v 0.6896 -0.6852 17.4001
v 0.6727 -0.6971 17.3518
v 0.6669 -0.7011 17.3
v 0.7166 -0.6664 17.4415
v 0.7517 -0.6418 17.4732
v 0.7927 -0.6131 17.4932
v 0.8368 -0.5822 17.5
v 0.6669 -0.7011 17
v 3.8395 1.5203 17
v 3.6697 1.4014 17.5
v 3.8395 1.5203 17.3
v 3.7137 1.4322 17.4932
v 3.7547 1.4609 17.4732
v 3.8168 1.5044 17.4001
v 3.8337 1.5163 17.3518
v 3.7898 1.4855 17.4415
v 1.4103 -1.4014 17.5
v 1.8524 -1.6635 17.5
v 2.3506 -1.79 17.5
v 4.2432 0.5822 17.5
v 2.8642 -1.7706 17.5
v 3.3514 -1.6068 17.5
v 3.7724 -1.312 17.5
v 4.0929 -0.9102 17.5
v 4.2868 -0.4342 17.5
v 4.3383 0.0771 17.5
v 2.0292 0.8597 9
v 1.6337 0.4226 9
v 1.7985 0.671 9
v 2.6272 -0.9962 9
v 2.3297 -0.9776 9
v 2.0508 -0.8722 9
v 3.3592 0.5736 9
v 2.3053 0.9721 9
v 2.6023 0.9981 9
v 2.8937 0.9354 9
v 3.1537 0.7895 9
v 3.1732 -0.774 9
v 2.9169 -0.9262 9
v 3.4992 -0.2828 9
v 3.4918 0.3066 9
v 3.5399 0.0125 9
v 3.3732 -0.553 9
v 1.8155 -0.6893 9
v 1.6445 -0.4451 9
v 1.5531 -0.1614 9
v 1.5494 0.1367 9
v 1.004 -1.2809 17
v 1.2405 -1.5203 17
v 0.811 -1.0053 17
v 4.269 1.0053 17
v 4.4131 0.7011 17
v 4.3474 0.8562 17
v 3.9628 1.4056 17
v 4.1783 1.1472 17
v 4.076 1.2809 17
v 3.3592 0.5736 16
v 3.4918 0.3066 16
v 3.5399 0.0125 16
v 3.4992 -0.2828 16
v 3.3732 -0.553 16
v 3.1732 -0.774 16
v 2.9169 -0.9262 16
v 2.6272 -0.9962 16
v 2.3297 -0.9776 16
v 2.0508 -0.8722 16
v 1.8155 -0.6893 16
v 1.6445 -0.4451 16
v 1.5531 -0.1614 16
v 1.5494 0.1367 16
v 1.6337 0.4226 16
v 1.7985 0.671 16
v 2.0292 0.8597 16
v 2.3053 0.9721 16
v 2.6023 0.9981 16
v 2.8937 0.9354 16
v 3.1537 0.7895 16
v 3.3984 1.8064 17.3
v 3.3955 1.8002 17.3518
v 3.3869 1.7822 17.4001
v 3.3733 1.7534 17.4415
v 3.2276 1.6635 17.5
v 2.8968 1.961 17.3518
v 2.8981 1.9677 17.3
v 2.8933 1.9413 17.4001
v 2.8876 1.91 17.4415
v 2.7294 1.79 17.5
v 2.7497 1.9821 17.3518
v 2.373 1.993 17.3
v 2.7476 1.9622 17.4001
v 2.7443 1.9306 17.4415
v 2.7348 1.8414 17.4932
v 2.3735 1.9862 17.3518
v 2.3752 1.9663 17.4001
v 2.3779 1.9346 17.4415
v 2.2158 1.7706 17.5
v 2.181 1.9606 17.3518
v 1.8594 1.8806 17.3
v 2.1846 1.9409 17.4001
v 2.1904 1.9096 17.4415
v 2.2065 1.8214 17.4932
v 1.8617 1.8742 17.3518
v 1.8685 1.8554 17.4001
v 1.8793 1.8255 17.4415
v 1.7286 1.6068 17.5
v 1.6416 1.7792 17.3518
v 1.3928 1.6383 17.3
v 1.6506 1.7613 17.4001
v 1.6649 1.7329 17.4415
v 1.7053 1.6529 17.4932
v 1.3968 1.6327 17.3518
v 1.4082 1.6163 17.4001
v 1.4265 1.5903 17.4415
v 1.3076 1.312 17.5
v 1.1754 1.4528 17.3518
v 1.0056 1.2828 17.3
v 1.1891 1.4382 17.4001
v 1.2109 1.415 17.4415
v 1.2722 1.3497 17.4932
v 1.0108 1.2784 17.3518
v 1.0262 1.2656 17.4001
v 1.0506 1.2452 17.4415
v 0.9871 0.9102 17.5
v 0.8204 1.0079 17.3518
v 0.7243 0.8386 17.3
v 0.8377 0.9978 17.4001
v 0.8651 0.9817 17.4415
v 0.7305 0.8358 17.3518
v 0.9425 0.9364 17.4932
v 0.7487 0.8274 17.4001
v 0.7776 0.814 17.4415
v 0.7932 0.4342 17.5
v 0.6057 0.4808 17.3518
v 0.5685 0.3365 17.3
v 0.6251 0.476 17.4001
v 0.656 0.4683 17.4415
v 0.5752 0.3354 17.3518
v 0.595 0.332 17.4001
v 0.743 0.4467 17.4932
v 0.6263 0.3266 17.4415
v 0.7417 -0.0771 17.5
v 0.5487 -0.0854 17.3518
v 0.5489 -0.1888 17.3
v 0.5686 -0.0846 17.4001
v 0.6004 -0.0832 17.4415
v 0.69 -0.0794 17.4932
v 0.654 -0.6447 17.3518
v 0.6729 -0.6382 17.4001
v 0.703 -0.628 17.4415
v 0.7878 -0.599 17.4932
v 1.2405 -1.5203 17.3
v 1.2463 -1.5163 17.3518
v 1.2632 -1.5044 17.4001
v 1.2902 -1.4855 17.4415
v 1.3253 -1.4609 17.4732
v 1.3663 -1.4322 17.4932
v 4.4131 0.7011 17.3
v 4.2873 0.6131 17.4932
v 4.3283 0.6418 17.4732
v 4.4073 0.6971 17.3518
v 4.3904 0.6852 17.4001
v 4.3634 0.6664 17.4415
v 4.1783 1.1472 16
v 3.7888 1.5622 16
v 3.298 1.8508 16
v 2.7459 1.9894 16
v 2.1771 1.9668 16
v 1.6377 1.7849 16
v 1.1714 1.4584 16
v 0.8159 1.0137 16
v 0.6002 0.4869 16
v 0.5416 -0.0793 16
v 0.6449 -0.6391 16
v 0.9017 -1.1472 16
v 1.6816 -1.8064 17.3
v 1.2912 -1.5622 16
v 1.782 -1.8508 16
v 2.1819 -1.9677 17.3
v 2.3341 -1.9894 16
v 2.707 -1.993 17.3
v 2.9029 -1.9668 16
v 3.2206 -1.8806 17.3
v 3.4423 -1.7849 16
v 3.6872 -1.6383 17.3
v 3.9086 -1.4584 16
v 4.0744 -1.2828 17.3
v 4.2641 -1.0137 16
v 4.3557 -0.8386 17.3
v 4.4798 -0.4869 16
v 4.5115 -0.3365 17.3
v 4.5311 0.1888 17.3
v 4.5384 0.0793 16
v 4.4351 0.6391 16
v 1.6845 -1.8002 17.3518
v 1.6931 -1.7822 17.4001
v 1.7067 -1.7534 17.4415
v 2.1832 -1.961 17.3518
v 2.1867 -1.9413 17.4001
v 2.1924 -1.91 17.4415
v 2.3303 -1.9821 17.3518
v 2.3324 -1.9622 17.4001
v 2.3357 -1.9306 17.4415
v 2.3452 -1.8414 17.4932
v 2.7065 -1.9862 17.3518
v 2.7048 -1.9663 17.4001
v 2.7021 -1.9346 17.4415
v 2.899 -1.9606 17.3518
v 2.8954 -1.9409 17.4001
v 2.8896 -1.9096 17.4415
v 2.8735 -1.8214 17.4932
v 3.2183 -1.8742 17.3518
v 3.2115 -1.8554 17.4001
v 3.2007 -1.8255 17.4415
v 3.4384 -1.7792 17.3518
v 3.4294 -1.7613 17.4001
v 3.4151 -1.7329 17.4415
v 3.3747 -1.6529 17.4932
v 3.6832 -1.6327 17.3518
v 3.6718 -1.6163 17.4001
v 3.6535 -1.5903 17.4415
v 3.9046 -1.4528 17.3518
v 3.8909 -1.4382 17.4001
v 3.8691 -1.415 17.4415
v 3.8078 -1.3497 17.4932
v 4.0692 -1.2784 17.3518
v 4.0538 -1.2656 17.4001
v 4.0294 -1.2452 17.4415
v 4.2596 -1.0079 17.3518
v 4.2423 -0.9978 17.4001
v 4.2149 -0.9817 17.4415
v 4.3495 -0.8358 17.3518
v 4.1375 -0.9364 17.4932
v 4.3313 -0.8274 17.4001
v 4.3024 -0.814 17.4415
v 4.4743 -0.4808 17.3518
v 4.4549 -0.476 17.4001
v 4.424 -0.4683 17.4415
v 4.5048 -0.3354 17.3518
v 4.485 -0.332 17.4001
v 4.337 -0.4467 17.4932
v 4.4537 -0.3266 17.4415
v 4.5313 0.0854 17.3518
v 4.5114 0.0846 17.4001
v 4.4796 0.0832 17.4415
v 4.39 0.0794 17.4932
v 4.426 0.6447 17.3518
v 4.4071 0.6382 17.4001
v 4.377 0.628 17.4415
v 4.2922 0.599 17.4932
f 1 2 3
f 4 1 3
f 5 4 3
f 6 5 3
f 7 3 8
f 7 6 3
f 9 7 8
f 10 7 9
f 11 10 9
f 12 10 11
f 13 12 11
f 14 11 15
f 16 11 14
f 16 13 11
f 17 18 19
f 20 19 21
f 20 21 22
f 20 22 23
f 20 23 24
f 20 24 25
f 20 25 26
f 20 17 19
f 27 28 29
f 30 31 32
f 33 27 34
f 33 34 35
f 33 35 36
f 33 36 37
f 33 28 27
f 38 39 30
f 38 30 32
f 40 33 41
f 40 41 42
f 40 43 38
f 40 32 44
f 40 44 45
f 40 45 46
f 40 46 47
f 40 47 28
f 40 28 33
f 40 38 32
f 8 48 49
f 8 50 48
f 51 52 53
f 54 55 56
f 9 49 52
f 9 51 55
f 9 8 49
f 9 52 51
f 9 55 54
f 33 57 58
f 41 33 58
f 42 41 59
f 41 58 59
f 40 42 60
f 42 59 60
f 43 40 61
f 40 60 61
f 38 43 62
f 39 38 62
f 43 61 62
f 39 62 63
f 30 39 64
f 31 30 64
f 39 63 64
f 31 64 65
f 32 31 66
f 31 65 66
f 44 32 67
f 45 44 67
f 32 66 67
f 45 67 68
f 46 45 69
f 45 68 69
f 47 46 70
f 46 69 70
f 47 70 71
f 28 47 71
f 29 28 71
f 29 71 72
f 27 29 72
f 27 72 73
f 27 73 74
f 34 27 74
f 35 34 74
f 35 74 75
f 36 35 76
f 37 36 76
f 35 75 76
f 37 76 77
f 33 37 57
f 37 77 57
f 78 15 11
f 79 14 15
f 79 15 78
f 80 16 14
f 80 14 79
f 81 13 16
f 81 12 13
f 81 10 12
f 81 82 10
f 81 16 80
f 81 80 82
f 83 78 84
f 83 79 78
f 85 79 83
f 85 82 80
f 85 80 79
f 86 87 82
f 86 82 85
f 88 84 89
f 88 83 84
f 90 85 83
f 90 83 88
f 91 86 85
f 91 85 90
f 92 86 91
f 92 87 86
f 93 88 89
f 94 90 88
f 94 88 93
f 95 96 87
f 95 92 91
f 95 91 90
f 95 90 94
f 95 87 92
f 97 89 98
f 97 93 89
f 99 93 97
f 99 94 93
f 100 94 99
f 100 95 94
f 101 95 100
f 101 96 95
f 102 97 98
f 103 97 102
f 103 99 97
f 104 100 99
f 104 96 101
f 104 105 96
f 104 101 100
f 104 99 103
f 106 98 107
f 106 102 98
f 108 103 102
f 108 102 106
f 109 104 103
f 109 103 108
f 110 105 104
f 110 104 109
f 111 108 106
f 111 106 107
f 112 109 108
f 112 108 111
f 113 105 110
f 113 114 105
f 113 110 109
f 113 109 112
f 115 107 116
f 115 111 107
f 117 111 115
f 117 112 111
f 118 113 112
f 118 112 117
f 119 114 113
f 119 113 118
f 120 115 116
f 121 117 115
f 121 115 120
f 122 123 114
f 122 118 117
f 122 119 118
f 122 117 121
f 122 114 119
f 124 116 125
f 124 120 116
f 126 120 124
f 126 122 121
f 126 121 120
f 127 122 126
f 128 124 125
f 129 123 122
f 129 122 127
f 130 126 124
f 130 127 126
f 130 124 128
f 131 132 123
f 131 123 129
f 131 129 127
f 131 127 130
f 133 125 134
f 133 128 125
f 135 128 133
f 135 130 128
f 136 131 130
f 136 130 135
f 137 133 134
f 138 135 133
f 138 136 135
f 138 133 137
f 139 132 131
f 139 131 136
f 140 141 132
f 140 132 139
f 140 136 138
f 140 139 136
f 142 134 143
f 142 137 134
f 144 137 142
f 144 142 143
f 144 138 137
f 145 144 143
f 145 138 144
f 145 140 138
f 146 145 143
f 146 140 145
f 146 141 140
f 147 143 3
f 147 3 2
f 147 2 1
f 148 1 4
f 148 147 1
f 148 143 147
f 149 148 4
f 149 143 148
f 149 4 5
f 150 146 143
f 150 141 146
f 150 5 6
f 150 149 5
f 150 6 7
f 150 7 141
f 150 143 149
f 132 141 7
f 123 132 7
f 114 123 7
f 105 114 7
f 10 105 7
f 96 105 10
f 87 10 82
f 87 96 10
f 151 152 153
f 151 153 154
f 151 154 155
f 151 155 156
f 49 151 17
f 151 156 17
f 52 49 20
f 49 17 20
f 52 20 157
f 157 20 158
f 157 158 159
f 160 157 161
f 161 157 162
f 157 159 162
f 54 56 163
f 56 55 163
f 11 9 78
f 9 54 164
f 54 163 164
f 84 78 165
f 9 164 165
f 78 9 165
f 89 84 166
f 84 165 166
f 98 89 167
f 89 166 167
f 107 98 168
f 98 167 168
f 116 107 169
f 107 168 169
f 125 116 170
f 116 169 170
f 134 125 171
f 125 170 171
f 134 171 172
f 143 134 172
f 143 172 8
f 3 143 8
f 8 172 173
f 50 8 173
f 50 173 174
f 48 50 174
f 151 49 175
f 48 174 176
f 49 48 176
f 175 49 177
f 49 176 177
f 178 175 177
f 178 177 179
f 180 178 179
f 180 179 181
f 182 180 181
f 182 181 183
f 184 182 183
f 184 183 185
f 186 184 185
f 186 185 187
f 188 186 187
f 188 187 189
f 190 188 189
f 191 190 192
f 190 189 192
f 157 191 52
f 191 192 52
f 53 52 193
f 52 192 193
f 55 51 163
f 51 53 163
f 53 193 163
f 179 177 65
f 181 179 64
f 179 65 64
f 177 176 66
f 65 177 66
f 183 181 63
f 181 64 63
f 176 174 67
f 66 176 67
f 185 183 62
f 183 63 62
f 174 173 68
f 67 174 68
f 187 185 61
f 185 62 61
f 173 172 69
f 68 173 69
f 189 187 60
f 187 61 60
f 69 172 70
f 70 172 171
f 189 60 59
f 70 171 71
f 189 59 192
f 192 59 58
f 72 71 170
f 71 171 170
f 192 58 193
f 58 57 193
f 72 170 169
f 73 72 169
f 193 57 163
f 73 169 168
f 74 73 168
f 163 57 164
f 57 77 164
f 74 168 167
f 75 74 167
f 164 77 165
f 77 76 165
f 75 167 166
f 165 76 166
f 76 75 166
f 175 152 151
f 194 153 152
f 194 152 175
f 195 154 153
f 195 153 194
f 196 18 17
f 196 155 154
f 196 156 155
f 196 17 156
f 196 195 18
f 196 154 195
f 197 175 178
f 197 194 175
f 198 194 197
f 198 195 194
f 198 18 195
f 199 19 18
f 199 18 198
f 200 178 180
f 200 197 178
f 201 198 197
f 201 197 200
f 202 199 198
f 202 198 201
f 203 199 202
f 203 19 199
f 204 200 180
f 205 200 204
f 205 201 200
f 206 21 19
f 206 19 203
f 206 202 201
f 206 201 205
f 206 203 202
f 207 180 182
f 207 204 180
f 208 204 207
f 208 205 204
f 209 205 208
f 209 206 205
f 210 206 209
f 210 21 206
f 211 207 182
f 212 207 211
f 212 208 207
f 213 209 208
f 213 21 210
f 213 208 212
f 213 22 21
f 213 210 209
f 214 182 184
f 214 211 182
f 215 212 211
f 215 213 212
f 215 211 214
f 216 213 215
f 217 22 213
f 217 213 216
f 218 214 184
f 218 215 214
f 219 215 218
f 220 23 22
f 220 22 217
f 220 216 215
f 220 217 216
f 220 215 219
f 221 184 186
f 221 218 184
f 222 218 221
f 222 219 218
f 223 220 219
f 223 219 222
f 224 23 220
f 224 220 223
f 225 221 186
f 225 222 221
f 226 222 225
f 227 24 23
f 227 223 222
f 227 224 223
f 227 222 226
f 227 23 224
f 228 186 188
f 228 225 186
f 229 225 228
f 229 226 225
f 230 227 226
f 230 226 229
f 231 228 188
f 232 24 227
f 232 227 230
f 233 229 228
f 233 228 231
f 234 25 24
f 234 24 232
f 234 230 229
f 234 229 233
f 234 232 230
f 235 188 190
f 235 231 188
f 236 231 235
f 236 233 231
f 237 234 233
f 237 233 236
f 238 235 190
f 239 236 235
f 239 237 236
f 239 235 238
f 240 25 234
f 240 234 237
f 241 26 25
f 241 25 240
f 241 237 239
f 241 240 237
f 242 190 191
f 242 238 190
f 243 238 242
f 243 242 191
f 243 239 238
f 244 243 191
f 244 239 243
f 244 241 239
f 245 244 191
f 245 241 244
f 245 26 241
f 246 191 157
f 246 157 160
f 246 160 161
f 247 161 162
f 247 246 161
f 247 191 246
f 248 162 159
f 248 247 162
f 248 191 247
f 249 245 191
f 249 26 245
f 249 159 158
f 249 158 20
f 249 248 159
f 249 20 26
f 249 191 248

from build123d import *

# Parameters (mm, degrees)
SKETCH003_R             = 2
PAD001_DEPTH            = 1.5
SKETCH004_R             = 1
PAD002_DEPTH            = 7
FILLET_R                = 0.2
SKETCH005_W             = 4.5
SKETCH005_H             = 1
POCKET002_DEPTH         = 0.5
BODY001_PLACEMENT_ANGLE = 35


with BuildPart() as part:
    # Sketch003 → Pad001 (new body)
    with BuildSketch(Plane.XY):
        Circle(SKETCH003_R)
    extrude(amount=PAD001_DEPTH)

    # Sketch004 (on Face2 of Pad001) → Pad002 (join)
    with BuildSketch(Plane(origin=(0, 0, 0), x_dir=(1, 0, 0), z_dir=(0, 0, -1))):
        Circle(SKETCH004_R)
    extrude(amount=PAD002_DEPTH)

    # Fillet
    fillet_edges = [part.edges().sort_by_distance(p)[0] for p in [
        (-2, 0, 1.5),
    ]]
    fillet(fillet_edges, radius=FILLET_R)

    # Sketch005 (on Face3 of Pad002) → Pocket002 (cut)
    with BuildSketch(Plane.XY.offset(1.5)):
        Rectangle(SKETCH005_W, SKETCH005_H)
    extrude(amount=-POCKET002_DEPTH, mode=Mode.SUBTRACT)


with BuildPart() as part_1:
    # Body001 placement: moved
    add(part.part.moved(Location((2.54, 0, 16))).rotate(Axis((2.54, 0, 16), (0, 0, 1)), BODY001_PLACEMENT_ANGLE))


solid = part_1.part
